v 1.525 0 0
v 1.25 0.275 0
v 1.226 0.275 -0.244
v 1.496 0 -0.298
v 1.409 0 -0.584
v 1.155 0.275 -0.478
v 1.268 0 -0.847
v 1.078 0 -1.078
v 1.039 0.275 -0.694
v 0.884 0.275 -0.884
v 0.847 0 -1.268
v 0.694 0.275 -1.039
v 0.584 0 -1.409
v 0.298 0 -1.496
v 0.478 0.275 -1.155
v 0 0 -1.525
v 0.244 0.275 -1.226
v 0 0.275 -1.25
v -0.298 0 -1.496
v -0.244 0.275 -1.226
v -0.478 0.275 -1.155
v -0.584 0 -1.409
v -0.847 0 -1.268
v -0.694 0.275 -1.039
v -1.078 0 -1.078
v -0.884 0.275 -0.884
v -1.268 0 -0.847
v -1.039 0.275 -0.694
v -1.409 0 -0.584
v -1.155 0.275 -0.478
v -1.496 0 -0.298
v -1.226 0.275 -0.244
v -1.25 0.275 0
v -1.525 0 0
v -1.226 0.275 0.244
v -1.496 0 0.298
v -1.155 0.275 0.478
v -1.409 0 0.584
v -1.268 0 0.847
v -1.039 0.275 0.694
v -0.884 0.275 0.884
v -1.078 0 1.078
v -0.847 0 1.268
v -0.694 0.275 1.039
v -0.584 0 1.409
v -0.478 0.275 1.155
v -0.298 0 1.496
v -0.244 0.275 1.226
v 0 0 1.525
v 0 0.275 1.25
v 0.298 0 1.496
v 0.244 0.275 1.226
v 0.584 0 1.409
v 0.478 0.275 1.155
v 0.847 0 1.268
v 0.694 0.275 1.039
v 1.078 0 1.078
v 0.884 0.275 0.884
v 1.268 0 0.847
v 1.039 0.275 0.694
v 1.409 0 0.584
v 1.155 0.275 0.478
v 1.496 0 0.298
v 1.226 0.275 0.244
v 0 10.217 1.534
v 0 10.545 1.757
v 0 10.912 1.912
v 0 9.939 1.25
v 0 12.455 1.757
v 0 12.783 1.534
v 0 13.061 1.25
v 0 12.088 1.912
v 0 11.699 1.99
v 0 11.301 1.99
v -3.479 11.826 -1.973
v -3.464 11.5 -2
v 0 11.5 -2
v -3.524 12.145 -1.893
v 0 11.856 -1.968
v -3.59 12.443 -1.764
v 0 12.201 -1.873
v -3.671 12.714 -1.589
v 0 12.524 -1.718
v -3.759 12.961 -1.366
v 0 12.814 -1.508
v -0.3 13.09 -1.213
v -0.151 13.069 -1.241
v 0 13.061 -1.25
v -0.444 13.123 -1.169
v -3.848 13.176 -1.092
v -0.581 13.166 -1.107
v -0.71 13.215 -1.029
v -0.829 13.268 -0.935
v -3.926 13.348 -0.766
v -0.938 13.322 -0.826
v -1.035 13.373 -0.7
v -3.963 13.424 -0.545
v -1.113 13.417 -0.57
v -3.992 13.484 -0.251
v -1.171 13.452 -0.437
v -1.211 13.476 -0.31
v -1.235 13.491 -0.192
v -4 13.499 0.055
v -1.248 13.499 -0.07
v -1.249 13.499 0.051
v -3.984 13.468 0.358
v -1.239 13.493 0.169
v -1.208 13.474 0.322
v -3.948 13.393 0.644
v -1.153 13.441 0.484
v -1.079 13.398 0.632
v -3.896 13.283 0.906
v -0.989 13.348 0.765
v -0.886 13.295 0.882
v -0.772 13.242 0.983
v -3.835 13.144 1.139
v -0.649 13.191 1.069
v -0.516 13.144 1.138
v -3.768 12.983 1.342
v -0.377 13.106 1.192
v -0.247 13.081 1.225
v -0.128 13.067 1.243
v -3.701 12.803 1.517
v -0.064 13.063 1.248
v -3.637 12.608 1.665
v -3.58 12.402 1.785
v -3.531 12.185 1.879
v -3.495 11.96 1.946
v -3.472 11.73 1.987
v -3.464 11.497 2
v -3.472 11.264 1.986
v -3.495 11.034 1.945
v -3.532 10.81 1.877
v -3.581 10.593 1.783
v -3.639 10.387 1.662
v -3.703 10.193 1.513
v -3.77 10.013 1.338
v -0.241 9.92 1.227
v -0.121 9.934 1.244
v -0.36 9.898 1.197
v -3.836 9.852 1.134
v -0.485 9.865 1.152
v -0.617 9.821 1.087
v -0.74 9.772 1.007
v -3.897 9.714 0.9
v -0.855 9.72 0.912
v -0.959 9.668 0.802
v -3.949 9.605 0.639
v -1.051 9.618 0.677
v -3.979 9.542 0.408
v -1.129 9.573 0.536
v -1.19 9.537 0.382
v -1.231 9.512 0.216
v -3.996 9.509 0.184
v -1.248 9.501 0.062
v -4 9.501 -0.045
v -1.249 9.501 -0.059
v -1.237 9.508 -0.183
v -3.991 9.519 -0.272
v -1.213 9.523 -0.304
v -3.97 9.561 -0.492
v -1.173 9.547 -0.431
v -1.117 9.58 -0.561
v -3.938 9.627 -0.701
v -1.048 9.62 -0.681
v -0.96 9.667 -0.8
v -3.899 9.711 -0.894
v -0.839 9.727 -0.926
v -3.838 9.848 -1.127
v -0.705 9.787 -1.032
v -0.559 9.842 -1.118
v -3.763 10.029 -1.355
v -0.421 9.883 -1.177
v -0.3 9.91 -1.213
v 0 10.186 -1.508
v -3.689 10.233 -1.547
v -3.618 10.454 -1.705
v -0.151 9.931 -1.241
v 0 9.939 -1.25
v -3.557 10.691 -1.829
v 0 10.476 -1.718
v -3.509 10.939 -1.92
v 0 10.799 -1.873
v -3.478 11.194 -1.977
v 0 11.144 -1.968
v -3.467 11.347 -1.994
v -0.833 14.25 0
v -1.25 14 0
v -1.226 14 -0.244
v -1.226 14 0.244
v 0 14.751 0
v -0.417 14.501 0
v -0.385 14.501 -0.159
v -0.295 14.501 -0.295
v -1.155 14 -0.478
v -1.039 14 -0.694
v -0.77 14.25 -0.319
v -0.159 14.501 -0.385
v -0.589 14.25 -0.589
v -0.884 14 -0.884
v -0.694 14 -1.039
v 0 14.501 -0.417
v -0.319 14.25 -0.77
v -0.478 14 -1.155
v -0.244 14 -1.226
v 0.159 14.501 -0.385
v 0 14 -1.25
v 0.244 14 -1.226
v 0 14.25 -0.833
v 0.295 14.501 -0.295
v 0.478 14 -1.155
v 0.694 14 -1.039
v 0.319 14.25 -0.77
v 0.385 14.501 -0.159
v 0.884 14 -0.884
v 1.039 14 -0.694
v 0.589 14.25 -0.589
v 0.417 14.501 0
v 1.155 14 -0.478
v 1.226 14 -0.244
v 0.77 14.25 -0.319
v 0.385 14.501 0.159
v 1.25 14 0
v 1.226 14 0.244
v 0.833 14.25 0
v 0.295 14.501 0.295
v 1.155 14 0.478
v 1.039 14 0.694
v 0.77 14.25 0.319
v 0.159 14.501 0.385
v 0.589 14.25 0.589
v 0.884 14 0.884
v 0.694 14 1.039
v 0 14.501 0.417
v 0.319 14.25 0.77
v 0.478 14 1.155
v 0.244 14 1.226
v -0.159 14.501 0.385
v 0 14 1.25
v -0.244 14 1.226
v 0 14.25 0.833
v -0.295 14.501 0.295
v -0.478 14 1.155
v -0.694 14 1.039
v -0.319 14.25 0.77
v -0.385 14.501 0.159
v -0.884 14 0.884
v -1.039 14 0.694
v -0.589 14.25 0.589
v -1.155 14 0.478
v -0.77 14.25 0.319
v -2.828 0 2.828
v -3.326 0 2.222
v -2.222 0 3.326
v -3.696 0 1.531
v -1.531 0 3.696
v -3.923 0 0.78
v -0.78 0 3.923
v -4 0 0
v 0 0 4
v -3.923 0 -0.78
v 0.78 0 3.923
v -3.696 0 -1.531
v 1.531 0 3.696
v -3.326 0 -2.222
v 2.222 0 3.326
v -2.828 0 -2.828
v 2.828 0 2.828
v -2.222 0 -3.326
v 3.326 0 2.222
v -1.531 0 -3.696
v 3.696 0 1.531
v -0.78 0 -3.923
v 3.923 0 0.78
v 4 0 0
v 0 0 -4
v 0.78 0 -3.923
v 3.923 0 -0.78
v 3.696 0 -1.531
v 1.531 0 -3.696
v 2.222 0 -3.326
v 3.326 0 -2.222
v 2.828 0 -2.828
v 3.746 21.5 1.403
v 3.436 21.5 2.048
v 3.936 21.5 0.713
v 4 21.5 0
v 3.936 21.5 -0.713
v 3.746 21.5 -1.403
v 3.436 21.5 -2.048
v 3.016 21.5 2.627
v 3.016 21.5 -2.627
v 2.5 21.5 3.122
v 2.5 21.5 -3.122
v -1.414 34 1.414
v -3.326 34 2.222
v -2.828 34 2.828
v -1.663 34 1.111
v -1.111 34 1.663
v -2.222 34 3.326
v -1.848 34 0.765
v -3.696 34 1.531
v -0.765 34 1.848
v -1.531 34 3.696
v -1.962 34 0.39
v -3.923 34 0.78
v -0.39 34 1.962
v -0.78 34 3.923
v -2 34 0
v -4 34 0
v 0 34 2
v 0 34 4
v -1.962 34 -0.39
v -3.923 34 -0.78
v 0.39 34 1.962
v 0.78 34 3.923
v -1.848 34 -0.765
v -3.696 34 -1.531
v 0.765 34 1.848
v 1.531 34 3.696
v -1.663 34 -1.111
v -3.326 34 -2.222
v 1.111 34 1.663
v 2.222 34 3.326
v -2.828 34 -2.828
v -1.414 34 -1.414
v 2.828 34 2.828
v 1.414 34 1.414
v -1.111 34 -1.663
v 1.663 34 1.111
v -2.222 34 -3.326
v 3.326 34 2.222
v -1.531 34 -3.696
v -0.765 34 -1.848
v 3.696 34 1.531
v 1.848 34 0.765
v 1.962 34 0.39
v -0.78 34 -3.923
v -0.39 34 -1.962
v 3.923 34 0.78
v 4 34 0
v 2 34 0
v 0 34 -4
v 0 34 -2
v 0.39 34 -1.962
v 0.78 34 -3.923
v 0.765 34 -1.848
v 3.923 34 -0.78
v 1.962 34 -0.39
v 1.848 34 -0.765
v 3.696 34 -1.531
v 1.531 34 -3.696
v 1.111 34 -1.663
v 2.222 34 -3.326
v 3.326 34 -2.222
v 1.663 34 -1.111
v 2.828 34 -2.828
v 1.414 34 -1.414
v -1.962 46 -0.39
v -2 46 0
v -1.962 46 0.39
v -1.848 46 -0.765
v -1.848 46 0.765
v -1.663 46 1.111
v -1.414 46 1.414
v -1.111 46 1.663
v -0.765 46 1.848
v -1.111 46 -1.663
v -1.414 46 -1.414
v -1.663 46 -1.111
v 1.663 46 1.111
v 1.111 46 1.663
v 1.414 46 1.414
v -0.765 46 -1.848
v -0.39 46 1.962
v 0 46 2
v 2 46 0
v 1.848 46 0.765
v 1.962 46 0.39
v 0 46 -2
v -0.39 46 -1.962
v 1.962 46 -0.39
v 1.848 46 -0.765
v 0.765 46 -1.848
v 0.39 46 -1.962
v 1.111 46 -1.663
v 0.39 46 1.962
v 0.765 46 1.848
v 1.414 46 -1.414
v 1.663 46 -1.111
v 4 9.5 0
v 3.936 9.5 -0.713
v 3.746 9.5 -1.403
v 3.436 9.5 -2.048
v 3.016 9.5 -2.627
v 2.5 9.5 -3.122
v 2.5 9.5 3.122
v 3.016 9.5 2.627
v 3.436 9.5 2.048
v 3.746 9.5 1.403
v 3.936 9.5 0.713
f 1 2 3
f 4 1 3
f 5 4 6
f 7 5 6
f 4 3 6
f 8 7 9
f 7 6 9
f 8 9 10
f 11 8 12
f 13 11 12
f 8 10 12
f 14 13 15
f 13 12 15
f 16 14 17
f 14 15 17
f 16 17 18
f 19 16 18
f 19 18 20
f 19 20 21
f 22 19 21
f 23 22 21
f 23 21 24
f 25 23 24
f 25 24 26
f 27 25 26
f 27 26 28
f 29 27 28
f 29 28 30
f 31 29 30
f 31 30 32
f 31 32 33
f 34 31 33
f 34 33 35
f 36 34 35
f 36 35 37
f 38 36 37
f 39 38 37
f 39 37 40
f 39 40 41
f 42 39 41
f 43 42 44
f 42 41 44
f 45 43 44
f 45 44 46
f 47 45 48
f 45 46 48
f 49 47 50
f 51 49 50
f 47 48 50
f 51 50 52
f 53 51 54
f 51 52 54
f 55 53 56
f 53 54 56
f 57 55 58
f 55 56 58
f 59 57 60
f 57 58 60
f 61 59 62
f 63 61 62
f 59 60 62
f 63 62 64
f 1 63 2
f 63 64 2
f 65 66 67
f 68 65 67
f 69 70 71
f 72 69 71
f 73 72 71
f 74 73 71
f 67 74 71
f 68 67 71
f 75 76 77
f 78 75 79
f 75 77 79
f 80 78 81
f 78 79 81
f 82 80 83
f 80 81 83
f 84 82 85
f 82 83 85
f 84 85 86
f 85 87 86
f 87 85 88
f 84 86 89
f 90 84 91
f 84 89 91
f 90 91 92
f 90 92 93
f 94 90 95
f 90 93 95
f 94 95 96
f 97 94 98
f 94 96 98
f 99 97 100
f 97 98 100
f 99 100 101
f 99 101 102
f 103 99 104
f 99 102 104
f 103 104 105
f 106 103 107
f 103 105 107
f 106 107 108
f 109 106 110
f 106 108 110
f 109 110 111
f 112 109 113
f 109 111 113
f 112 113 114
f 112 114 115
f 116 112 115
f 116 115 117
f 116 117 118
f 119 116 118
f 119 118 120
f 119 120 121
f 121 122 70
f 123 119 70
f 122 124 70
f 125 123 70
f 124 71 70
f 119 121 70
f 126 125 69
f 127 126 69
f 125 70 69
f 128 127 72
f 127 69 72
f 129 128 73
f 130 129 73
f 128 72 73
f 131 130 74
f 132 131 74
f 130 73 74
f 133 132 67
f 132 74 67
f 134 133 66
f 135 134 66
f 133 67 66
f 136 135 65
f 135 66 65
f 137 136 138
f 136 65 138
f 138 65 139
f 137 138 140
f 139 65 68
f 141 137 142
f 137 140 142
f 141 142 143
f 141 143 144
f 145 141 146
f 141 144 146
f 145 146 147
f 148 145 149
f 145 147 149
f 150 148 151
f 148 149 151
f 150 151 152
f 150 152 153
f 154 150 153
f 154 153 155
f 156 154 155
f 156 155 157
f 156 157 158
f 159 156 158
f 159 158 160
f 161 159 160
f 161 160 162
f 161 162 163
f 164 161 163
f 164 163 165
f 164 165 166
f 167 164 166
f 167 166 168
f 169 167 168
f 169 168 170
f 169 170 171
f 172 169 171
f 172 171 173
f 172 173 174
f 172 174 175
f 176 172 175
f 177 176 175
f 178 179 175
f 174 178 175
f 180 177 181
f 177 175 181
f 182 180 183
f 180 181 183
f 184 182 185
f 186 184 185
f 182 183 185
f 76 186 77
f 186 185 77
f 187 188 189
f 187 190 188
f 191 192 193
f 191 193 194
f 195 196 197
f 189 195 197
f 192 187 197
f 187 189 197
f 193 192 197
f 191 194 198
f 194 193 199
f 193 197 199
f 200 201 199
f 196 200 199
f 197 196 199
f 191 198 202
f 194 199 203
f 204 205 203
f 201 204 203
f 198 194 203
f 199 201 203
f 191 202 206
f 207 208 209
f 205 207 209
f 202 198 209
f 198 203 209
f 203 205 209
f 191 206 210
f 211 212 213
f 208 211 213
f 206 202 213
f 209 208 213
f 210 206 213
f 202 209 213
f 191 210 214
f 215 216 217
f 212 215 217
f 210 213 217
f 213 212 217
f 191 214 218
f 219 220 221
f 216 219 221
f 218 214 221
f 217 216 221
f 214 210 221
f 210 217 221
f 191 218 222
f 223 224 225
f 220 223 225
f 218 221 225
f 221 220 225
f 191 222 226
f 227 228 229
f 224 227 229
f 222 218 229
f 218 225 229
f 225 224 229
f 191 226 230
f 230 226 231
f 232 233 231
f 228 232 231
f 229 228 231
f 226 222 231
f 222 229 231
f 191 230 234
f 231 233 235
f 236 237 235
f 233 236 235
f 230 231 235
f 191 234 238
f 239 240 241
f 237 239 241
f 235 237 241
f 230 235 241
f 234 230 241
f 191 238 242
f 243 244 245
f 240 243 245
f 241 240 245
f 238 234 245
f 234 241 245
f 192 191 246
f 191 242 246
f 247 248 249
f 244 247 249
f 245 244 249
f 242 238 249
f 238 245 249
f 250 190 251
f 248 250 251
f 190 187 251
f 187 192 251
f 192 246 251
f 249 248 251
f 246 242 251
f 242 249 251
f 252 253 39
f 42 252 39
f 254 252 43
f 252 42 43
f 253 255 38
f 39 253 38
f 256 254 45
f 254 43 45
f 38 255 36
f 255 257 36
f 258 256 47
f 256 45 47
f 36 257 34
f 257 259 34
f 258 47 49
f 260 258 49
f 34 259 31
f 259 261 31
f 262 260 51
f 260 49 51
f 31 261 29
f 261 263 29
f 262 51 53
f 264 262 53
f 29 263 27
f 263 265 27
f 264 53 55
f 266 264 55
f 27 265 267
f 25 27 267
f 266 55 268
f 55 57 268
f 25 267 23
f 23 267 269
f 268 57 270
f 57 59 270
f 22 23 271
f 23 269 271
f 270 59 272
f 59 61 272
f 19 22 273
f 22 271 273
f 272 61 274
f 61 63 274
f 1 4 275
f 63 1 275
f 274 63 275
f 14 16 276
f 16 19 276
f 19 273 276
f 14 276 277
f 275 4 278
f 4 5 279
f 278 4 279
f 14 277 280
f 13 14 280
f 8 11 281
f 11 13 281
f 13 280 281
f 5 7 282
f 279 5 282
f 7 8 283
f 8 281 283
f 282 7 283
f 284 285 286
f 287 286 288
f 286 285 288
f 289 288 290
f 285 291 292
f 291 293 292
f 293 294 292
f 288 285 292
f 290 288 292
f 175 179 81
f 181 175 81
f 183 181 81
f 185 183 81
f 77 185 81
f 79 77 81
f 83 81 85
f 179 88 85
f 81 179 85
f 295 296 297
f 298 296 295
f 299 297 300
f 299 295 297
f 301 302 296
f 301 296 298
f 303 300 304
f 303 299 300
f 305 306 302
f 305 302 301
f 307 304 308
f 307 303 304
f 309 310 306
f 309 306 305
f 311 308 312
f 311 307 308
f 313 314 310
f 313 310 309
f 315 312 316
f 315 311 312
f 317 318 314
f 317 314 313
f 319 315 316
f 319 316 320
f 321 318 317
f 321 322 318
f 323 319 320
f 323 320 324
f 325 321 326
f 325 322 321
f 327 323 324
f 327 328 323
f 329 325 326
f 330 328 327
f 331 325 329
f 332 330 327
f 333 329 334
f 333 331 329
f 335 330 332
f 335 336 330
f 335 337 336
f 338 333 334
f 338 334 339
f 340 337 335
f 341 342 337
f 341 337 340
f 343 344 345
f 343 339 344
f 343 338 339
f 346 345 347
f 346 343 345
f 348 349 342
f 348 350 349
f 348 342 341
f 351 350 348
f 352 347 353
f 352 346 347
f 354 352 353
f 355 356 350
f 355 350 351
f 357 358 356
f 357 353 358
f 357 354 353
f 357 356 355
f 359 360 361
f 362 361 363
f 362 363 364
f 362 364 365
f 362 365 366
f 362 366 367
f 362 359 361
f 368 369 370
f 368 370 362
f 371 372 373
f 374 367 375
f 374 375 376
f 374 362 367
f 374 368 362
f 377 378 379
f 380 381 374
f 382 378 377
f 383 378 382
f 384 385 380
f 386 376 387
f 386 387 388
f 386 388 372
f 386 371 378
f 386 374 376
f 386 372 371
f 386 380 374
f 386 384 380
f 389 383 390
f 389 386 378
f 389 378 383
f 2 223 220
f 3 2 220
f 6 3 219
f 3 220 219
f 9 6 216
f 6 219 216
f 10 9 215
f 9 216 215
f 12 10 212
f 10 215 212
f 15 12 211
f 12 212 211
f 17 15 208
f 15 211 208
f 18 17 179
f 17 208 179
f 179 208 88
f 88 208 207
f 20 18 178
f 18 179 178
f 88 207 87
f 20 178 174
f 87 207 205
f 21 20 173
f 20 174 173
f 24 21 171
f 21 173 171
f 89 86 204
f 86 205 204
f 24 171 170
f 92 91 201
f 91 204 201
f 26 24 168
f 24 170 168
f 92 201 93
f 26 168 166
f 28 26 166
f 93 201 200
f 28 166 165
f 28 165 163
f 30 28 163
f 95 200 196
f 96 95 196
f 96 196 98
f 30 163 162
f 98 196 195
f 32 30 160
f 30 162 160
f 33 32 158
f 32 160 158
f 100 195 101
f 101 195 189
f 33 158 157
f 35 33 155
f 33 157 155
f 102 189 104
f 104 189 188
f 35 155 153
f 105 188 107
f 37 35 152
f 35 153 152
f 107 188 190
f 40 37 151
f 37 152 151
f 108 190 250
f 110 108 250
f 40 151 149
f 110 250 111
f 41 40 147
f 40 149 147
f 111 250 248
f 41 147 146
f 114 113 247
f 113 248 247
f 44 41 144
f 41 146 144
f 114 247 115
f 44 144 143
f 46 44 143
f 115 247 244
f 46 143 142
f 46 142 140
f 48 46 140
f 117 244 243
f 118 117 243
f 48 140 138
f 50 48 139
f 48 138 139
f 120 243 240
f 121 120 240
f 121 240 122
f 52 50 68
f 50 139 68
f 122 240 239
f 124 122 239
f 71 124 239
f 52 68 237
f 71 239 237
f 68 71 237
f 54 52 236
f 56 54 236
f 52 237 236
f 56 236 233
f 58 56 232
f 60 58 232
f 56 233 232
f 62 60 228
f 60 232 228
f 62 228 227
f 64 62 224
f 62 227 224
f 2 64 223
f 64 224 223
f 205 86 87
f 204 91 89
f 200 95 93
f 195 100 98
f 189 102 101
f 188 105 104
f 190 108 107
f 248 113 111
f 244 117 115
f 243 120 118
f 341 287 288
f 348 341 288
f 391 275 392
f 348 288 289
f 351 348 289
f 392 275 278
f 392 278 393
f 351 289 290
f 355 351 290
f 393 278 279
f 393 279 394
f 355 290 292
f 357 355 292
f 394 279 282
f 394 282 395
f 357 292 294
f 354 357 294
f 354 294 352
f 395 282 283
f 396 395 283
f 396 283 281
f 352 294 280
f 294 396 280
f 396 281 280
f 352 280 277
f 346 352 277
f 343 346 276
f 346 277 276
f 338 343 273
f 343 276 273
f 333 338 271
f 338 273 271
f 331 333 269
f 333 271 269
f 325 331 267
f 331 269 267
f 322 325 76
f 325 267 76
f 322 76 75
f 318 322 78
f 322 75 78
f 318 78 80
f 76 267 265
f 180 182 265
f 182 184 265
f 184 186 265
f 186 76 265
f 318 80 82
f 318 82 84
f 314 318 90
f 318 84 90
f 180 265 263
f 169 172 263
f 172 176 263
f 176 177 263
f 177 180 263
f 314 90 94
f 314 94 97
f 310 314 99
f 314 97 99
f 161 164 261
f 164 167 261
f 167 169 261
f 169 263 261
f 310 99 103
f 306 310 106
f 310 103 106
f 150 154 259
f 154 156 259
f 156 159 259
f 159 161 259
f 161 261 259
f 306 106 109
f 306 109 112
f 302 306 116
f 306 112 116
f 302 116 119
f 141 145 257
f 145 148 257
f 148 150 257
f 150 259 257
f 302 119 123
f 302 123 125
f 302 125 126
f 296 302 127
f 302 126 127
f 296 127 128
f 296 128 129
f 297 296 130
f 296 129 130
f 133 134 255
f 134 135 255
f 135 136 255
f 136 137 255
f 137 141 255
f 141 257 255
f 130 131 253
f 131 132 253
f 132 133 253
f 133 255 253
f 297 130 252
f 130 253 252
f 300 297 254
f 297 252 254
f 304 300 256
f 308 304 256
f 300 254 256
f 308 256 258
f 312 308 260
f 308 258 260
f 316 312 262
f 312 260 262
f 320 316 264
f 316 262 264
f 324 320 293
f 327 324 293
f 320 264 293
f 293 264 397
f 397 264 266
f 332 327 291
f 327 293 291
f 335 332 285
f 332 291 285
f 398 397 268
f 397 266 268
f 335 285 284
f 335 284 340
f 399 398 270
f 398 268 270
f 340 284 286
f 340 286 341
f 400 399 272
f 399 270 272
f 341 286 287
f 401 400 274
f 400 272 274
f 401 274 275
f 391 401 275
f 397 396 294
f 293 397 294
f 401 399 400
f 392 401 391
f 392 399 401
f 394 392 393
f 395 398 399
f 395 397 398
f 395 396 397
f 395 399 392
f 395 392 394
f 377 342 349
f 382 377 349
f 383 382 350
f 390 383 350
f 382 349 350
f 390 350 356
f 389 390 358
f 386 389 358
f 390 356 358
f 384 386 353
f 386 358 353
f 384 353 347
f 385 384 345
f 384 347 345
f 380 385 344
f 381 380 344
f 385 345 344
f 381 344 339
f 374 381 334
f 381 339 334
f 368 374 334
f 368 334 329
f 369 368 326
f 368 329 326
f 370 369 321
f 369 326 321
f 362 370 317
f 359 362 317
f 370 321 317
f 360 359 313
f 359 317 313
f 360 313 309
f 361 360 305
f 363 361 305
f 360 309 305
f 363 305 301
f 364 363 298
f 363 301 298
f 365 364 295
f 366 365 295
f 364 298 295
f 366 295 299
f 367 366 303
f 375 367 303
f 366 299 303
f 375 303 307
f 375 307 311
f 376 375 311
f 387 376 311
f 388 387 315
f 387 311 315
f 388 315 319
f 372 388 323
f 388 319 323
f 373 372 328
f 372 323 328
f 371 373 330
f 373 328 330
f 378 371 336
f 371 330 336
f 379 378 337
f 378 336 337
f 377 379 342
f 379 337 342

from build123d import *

# Parameters (mm, degrees)
SKETCH1_R                   = 4
BOSS_EXTRUDE1_DEPTH         = 34
SKETCH2_R                   = 2
BOSS_EXTRUDE2_DEPTH         = 12
SKETCH3_W                   = 1.5
SKETCH3_H                   = 12
CUT_EXTRUDE1_DEPTH          = 5
CUT_EXTRUDE1_DEPTH_BACK     = 5
M3_TAPPED_HOLE1_D           = 2.5
M3_TAPPED_HOLE1_DEPTH       = 14
M3_TAPPED_HOLE1_CSINK_D     = 3.05
M3_TAPPED_HOLE1_CSINK_ANGLE = 90
M3_TAPPED_HOLE1_TIP         = 0.751075774
SKETCH7_R                   = 2
CUT_EXTRUDE2_DEPTH          = 12


with BuildPart() as part:
    # Sketch1 → Boss-Extrude1 (new body)
    with BuildSketch(Plane(origin=(0, 0, 0), x_dir=(1, 0, 0), z_dir=(0, 1, 0))):
        Circle(SKETCH1_R)
    extrude(amount=BOSS_EXTRUDE1_DEPTH)

    # Sketch2 → Boss-Extrude2 (add)
    with BuildSketch(Plane(origin=(0, 34, 0), x_dir=(1, 0, 0), z_dir=(0, 1, 0))):
        Circle(SKETCH2_R)
    extrude(amount=BOSS_EXTRUDE2_DEPTH)

    # Sketch3 → Cut-Extrude1 (cut, two sides)
    with BuildSketch(Plane.XY) as cut_extrude1_sk:
        with Locations((3.25, 15.5)):
            Rectangle(SKETCH3_W, SKETCH3_H)
    extrude(amount=CUT_EXTRUDE1_DEPTH, mode=Mode.SUBTRACT)
    extrude(cut_extrude1_sk.sketch, amount=-CUT_EXTRUDE1_DEPTH_BACK, mode=Mode.SUBTRACT)

    # M3 Tapped Hole1
    with Locations(Plane(origin=(0, 0, 0), x_dir=(-1, 0, 0), z_dir=(0, -1, 0))):
        with Locations((0, 0)):
            CounterSinkHole(M3_TAPPED_HOLE1_D / 2, M3_TAPPED_HOLE1_CSINK_D / 2, depth=M3_TAPPED_HOLE1_DEPTH, counter_sink_angle=M3_TAPPED_HOLE1_CSINK_ANGLE)
            with Locations((0, 0, -(M3_TAPPED_HOLE1_DEPTH + M3_TAPPED_HOLE1_TIP / 2))):  # 118° drill point
                Cone(0, M3_TAPPED_HOLE1_D / 2, M3_TAPPED_HOLE1_TIP, mode=Mode.SUBTRACT)

    # Sketch7 → Cut-Extrude2 (cut)
    with BuildSketch(Plane(origin=(0, 0, 0), x_dir=(0, 0, -1), z_dir=(1, 0, 0))):
        with Locations((0, 11.5)):
            Circle(SKETCH7_R)
    extrude(amount=-CUT_EXTRUDE2_DEPTH, mode=Mode.SUBTRACT)


solid = part.part
